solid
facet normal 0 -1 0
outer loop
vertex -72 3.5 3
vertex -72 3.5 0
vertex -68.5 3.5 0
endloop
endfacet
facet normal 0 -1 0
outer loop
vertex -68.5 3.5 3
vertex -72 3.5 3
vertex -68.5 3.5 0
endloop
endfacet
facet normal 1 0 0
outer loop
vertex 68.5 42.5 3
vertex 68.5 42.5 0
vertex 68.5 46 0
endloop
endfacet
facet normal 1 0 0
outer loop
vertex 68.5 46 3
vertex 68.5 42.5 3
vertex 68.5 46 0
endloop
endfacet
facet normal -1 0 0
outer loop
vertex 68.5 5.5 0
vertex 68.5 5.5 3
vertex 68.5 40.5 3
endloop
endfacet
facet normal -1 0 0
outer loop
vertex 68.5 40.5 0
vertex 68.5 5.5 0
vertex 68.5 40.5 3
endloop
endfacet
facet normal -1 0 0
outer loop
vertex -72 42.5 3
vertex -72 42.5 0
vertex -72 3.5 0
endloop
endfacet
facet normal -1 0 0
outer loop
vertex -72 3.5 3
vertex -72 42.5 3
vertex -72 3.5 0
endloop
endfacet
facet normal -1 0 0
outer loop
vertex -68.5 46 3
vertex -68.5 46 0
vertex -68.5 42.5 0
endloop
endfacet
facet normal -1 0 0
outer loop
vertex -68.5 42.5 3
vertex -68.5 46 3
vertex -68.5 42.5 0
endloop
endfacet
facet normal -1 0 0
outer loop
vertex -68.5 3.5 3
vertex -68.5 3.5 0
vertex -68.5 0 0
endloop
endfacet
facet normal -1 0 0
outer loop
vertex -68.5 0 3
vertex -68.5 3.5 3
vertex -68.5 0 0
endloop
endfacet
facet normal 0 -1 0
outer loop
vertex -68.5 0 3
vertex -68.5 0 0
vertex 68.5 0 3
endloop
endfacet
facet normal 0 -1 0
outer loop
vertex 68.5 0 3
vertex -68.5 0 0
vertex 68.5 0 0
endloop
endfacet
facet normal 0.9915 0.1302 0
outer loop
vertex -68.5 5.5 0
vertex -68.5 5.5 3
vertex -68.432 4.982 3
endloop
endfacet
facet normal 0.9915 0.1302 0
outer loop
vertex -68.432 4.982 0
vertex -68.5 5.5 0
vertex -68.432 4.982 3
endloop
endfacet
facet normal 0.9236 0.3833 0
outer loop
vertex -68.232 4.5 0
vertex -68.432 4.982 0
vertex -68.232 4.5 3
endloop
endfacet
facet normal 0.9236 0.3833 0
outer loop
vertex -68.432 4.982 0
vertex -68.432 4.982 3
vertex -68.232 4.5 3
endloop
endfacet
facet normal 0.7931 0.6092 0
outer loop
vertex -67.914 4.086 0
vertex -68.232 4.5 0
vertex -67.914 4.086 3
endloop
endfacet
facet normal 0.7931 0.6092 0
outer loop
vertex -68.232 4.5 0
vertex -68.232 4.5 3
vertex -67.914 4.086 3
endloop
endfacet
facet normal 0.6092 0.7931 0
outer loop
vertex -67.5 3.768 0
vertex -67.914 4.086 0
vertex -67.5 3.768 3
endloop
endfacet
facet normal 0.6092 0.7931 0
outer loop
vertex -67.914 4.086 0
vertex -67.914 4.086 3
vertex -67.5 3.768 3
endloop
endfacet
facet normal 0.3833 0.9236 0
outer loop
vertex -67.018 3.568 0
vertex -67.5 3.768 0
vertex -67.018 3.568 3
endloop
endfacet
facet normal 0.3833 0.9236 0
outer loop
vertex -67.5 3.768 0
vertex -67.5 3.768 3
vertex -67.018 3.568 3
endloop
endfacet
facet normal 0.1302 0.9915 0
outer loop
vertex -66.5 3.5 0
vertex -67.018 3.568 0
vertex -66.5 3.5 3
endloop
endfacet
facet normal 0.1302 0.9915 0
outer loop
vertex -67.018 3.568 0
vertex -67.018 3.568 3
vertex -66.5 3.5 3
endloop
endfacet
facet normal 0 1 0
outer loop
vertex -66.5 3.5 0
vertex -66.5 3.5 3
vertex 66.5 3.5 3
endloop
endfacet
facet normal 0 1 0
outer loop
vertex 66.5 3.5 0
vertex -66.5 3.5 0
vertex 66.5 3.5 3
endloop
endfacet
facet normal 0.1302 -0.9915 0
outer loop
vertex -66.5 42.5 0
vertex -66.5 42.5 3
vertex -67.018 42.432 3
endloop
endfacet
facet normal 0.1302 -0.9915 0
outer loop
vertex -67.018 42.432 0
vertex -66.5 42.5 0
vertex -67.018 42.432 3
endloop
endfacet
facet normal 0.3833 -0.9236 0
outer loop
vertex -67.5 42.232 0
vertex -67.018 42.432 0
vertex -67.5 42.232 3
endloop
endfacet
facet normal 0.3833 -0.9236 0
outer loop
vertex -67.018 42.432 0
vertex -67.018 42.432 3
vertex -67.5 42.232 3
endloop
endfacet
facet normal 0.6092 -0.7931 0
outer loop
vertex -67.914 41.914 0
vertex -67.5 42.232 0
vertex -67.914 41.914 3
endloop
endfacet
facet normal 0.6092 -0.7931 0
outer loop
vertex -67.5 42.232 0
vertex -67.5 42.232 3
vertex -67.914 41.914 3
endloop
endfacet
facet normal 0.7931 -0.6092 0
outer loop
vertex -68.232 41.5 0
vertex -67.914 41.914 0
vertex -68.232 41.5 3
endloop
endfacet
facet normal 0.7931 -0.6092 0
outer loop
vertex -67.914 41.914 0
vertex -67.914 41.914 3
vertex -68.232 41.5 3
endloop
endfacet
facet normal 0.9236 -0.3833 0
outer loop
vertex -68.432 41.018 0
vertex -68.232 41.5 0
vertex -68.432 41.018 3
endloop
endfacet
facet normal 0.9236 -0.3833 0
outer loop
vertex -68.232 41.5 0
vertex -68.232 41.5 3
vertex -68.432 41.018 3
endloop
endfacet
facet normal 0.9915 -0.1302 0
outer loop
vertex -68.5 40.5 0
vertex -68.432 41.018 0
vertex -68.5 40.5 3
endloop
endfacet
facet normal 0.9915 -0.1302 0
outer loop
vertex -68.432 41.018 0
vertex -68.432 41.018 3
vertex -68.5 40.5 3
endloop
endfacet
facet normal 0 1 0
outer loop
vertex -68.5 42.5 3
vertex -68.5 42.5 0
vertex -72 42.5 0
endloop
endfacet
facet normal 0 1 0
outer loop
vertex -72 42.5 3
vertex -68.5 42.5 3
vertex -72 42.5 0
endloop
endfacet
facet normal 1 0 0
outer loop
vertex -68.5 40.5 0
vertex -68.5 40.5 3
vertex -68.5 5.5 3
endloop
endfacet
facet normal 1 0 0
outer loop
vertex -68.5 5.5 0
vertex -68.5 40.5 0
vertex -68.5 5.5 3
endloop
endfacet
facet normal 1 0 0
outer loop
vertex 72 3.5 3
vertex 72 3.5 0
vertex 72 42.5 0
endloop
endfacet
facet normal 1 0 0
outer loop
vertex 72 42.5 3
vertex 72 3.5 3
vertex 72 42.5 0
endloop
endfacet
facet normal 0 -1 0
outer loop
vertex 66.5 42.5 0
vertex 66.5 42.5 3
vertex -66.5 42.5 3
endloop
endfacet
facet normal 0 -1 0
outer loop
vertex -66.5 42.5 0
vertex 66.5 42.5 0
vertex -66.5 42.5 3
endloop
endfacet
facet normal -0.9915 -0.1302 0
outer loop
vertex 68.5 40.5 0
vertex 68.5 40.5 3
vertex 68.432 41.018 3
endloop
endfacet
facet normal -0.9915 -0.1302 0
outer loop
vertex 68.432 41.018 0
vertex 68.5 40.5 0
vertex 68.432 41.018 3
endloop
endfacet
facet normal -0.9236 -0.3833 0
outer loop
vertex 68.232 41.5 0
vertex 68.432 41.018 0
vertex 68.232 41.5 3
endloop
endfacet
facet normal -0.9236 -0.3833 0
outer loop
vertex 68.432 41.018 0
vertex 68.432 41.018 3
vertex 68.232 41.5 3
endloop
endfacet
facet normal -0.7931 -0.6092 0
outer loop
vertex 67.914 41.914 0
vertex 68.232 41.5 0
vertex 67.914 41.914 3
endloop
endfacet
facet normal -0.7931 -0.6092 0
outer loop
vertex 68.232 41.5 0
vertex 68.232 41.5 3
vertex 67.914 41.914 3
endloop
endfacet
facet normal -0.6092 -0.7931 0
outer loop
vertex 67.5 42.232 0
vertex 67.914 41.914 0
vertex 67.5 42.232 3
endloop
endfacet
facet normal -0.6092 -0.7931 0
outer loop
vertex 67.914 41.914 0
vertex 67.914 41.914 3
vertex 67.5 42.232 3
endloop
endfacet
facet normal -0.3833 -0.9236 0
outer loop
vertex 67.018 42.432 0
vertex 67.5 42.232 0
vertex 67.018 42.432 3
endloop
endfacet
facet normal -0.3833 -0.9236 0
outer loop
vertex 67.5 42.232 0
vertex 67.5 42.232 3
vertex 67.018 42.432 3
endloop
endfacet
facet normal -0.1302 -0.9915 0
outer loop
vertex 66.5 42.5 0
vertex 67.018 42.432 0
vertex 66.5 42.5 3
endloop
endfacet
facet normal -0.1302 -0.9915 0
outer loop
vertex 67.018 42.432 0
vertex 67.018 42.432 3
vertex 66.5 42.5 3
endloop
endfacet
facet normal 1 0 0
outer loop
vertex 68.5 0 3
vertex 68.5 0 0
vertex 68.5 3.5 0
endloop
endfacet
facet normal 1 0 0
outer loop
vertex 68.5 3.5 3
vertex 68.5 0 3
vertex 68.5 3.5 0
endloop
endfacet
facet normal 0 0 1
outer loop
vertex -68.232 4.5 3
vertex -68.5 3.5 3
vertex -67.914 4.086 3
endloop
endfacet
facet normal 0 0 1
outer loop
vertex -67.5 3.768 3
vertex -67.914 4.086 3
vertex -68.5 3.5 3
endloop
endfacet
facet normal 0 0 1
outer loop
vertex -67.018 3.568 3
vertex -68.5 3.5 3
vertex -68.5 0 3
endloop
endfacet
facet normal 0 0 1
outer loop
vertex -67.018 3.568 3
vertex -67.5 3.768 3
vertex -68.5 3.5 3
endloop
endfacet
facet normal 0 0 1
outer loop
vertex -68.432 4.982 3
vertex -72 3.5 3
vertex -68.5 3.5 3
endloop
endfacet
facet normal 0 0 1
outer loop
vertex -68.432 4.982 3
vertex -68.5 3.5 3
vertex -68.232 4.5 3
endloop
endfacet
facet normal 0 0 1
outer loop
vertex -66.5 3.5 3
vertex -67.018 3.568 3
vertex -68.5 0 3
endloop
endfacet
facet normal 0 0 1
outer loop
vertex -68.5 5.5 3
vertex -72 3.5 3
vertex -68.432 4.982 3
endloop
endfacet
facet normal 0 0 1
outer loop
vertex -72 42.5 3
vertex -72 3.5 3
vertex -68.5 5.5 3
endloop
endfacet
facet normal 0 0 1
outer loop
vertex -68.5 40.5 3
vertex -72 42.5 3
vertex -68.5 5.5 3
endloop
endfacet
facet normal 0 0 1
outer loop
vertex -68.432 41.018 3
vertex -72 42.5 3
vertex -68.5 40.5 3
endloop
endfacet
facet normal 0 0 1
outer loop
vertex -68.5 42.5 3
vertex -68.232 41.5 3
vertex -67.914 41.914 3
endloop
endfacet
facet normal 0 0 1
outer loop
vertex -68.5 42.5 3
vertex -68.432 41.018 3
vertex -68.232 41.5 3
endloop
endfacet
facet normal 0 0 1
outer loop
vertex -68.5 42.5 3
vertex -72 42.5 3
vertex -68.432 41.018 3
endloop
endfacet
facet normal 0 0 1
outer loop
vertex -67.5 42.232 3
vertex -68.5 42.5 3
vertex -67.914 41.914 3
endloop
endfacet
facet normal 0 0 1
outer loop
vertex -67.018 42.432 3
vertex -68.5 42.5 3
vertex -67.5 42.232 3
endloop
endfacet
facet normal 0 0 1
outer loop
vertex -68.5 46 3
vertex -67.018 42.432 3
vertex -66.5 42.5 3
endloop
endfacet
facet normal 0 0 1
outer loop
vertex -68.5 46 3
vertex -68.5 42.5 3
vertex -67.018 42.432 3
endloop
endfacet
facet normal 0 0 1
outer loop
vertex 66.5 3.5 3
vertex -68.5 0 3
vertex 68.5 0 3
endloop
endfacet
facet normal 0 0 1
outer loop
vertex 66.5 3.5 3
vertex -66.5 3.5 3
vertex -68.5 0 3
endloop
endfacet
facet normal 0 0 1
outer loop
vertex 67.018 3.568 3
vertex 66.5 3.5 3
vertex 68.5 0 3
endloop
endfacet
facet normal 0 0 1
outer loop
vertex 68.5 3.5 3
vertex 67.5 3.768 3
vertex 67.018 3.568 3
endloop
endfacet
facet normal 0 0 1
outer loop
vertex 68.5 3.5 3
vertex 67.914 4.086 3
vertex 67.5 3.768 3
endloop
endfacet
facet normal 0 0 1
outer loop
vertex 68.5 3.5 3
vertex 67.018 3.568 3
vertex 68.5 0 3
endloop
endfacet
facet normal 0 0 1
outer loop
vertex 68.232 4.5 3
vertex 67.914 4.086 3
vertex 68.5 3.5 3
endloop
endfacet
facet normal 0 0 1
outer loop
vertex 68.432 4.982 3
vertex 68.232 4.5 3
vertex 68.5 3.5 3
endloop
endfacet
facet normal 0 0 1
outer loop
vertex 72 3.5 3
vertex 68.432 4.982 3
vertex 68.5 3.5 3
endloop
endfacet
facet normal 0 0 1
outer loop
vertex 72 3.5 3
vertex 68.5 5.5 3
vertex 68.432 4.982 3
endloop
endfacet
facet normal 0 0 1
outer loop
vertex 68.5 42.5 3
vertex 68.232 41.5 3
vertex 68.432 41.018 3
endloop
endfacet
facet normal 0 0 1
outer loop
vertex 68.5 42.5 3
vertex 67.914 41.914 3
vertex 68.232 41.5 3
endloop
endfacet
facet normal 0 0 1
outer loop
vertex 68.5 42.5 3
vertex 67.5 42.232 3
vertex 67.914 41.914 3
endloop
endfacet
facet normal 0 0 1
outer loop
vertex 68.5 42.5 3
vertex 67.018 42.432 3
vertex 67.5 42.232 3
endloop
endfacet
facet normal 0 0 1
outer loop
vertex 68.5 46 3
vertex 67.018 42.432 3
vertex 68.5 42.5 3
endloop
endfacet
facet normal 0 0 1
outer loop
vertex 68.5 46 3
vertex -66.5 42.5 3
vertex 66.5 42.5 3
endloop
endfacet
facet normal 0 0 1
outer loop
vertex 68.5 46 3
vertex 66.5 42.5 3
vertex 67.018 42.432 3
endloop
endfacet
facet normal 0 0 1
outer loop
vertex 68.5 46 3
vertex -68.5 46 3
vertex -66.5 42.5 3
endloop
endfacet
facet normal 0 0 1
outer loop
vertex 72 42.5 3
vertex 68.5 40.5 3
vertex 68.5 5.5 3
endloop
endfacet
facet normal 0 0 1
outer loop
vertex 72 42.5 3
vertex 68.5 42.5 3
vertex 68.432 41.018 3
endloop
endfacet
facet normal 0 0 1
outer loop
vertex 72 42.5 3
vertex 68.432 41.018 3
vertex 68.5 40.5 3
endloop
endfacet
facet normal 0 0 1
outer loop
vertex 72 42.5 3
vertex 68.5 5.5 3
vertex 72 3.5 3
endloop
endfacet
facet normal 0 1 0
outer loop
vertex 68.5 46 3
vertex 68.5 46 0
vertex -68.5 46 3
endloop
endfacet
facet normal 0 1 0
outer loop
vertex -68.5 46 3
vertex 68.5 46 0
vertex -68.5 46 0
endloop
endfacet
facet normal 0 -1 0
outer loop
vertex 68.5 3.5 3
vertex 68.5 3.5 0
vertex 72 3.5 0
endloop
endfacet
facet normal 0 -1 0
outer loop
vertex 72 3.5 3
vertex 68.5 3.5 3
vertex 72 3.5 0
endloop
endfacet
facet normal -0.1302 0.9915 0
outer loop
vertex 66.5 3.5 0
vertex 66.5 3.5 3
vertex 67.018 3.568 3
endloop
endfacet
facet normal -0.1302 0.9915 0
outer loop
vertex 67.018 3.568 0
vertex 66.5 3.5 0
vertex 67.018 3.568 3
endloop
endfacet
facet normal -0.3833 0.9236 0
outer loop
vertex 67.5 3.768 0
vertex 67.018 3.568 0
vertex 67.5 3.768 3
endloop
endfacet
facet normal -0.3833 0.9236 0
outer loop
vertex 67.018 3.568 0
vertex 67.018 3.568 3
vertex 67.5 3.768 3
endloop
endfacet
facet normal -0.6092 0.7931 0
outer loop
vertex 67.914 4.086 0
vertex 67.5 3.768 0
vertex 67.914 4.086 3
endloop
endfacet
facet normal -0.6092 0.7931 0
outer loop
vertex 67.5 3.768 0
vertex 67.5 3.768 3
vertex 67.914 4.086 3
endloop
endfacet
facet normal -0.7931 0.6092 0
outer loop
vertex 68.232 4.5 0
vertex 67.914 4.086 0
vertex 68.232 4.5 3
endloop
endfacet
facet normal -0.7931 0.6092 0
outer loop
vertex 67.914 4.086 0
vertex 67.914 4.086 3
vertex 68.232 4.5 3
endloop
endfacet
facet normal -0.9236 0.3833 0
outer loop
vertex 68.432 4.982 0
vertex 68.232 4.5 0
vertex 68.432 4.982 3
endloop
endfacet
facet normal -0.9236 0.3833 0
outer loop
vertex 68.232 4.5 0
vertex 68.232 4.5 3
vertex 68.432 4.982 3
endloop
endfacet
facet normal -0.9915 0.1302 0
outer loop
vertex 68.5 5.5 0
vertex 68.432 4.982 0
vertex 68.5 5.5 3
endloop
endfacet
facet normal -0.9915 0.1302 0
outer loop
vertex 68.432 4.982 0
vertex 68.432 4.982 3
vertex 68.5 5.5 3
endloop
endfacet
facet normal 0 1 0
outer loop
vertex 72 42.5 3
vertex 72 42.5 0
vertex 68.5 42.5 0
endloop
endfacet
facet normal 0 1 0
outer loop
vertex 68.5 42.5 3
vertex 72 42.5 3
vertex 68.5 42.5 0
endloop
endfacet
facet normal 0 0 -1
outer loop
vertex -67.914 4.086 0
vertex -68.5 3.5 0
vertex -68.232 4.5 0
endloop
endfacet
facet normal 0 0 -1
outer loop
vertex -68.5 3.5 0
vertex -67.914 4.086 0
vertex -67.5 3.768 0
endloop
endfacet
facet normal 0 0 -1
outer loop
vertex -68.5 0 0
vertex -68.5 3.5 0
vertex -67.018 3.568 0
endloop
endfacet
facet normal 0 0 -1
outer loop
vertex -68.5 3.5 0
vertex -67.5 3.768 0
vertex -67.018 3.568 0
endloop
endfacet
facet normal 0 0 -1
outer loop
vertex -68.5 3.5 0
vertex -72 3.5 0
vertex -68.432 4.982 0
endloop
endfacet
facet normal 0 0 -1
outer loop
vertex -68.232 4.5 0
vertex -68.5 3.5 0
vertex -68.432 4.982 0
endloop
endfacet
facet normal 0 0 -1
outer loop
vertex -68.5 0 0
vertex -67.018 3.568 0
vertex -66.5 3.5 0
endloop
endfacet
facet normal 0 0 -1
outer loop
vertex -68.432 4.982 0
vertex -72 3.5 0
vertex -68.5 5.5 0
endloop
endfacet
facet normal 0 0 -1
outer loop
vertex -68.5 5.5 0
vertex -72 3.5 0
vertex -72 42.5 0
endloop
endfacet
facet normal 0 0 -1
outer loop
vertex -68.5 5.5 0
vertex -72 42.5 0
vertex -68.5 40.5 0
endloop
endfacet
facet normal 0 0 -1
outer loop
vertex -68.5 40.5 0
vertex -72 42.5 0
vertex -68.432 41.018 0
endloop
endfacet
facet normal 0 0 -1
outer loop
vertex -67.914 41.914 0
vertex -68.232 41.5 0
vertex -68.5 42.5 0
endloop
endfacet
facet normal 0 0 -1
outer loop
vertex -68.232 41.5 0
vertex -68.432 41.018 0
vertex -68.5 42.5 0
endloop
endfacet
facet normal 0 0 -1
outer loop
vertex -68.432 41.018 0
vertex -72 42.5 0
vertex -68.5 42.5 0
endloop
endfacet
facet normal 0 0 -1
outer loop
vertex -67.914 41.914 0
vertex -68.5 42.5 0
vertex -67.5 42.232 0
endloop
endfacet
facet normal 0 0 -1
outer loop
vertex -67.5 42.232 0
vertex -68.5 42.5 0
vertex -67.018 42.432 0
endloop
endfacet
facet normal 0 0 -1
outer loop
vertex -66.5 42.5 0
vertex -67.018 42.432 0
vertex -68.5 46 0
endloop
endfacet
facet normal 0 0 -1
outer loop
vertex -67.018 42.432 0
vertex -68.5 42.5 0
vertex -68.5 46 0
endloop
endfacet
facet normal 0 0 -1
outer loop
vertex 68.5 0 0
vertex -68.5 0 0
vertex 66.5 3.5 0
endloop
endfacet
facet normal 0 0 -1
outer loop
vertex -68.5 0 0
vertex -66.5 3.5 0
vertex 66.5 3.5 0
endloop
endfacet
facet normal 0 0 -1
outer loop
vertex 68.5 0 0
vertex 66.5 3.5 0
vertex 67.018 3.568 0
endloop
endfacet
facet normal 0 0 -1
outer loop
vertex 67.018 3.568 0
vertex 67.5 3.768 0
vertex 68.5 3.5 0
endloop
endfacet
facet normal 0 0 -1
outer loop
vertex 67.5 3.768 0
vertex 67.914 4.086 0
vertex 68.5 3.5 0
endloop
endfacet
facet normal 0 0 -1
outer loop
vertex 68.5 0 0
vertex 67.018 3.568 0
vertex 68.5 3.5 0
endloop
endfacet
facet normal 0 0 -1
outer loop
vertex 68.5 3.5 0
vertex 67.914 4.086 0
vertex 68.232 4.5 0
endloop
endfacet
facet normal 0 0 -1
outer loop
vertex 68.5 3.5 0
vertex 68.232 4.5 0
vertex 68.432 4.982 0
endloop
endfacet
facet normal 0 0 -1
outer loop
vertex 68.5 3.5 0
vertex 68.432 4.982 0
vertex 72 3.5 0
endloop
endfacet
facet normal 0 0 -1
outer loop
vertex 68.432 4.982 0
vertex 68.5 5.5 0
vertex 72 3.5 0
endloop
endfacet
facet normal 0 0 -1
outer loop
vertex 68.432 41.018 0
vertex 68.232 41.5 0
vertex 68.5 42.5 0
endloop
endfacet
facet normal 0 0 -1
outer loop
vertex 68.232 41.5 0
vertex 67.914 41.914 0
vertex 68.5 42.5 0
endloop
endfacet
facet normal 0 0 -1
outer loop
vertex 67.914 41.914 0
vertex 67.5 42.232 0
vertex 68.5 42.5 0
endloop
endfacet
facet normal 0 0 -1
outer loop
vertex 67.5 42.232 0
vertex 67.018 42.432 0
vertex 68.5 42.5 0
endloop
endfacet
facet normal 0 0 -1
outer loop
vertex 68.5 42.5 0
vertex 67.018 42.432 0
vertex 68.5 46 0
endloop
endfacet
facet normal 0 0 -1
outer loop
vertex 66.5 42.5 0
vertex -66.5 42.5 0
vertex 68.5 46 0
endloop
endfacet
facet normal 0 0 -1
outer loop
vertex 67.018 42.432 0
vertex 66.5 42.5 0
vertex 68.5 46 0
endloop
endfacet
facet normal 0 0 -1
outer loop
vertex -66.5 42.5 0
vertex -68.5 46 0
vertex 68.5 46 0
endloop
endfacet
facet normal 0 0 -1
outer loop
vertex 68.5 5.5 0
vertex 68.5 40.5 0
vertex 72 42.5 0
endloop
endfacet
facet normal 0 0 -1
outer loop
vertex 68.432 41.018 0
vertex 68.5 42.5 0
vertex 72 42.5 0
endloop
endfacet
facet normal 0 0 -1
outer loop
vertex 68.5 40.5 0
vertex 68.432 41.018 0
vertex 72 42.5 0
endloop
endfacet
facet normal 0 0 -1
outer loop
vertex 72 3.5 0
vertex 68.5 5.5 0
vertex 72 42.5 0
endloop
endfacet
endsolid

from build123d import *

# Parameters (mm, degrees)
BOSS_EXTRUDE1_DEPTH = 3
CUT_EXTRUDE3_DEPTH  = 3


with BuildPart() as part:
    # Sketch1 → Boss-Extrude1 (new body)
    with BuildSketch(Plane.XY):
        Polygon((68.5, 46), (-68.5, 46), (-68.5, 42.5), (-72, 42.5), (-72, 3.5), (-68.5, 3.5), (-68.5, 0), (68.5, 0), (68.5, 3.5), (72, 3.5), (72, 42.5), (68.5, 42.5), align=None)
    extrude(amount=BOSS_EXTRUDE1_DEPTH)

    # Sketch2 → Cut-Extrude3 (cut)
    with BuildSketch(Plane.XY.offset(3)):
        with BuildLine():
            Line((68.5, 5.5), (68.5, 40.5))
            ThreePointArc((68.5, 40.5), (67.914213562, 41.914213562), (66.5, 42.5))
            Line((66.5, 42.5), (-66.5, 42.5))
            ThreePointArc((-66.5, 42.5), (-67.914213562, 41.914213562), (-68.5, 40.5))
            Line((-68.5, 40.5), (-68.5, 5.5))
            ThreePointArc((-68.5, 5.5), (-67.914213562, 4.085786438), (-66.5, 3.5))
            Line((-66.5, 3.5), (66.5, 3.5))
            ThreePointArc((66.5, 3.5), (67.914213562, 4.085786438), (68.5, 5.5))
        make_face()
    extrude(amount=-CUT_EXTRUDE3_DEPTH, mode=Mode.SUBTRACT)


solid = part.part
